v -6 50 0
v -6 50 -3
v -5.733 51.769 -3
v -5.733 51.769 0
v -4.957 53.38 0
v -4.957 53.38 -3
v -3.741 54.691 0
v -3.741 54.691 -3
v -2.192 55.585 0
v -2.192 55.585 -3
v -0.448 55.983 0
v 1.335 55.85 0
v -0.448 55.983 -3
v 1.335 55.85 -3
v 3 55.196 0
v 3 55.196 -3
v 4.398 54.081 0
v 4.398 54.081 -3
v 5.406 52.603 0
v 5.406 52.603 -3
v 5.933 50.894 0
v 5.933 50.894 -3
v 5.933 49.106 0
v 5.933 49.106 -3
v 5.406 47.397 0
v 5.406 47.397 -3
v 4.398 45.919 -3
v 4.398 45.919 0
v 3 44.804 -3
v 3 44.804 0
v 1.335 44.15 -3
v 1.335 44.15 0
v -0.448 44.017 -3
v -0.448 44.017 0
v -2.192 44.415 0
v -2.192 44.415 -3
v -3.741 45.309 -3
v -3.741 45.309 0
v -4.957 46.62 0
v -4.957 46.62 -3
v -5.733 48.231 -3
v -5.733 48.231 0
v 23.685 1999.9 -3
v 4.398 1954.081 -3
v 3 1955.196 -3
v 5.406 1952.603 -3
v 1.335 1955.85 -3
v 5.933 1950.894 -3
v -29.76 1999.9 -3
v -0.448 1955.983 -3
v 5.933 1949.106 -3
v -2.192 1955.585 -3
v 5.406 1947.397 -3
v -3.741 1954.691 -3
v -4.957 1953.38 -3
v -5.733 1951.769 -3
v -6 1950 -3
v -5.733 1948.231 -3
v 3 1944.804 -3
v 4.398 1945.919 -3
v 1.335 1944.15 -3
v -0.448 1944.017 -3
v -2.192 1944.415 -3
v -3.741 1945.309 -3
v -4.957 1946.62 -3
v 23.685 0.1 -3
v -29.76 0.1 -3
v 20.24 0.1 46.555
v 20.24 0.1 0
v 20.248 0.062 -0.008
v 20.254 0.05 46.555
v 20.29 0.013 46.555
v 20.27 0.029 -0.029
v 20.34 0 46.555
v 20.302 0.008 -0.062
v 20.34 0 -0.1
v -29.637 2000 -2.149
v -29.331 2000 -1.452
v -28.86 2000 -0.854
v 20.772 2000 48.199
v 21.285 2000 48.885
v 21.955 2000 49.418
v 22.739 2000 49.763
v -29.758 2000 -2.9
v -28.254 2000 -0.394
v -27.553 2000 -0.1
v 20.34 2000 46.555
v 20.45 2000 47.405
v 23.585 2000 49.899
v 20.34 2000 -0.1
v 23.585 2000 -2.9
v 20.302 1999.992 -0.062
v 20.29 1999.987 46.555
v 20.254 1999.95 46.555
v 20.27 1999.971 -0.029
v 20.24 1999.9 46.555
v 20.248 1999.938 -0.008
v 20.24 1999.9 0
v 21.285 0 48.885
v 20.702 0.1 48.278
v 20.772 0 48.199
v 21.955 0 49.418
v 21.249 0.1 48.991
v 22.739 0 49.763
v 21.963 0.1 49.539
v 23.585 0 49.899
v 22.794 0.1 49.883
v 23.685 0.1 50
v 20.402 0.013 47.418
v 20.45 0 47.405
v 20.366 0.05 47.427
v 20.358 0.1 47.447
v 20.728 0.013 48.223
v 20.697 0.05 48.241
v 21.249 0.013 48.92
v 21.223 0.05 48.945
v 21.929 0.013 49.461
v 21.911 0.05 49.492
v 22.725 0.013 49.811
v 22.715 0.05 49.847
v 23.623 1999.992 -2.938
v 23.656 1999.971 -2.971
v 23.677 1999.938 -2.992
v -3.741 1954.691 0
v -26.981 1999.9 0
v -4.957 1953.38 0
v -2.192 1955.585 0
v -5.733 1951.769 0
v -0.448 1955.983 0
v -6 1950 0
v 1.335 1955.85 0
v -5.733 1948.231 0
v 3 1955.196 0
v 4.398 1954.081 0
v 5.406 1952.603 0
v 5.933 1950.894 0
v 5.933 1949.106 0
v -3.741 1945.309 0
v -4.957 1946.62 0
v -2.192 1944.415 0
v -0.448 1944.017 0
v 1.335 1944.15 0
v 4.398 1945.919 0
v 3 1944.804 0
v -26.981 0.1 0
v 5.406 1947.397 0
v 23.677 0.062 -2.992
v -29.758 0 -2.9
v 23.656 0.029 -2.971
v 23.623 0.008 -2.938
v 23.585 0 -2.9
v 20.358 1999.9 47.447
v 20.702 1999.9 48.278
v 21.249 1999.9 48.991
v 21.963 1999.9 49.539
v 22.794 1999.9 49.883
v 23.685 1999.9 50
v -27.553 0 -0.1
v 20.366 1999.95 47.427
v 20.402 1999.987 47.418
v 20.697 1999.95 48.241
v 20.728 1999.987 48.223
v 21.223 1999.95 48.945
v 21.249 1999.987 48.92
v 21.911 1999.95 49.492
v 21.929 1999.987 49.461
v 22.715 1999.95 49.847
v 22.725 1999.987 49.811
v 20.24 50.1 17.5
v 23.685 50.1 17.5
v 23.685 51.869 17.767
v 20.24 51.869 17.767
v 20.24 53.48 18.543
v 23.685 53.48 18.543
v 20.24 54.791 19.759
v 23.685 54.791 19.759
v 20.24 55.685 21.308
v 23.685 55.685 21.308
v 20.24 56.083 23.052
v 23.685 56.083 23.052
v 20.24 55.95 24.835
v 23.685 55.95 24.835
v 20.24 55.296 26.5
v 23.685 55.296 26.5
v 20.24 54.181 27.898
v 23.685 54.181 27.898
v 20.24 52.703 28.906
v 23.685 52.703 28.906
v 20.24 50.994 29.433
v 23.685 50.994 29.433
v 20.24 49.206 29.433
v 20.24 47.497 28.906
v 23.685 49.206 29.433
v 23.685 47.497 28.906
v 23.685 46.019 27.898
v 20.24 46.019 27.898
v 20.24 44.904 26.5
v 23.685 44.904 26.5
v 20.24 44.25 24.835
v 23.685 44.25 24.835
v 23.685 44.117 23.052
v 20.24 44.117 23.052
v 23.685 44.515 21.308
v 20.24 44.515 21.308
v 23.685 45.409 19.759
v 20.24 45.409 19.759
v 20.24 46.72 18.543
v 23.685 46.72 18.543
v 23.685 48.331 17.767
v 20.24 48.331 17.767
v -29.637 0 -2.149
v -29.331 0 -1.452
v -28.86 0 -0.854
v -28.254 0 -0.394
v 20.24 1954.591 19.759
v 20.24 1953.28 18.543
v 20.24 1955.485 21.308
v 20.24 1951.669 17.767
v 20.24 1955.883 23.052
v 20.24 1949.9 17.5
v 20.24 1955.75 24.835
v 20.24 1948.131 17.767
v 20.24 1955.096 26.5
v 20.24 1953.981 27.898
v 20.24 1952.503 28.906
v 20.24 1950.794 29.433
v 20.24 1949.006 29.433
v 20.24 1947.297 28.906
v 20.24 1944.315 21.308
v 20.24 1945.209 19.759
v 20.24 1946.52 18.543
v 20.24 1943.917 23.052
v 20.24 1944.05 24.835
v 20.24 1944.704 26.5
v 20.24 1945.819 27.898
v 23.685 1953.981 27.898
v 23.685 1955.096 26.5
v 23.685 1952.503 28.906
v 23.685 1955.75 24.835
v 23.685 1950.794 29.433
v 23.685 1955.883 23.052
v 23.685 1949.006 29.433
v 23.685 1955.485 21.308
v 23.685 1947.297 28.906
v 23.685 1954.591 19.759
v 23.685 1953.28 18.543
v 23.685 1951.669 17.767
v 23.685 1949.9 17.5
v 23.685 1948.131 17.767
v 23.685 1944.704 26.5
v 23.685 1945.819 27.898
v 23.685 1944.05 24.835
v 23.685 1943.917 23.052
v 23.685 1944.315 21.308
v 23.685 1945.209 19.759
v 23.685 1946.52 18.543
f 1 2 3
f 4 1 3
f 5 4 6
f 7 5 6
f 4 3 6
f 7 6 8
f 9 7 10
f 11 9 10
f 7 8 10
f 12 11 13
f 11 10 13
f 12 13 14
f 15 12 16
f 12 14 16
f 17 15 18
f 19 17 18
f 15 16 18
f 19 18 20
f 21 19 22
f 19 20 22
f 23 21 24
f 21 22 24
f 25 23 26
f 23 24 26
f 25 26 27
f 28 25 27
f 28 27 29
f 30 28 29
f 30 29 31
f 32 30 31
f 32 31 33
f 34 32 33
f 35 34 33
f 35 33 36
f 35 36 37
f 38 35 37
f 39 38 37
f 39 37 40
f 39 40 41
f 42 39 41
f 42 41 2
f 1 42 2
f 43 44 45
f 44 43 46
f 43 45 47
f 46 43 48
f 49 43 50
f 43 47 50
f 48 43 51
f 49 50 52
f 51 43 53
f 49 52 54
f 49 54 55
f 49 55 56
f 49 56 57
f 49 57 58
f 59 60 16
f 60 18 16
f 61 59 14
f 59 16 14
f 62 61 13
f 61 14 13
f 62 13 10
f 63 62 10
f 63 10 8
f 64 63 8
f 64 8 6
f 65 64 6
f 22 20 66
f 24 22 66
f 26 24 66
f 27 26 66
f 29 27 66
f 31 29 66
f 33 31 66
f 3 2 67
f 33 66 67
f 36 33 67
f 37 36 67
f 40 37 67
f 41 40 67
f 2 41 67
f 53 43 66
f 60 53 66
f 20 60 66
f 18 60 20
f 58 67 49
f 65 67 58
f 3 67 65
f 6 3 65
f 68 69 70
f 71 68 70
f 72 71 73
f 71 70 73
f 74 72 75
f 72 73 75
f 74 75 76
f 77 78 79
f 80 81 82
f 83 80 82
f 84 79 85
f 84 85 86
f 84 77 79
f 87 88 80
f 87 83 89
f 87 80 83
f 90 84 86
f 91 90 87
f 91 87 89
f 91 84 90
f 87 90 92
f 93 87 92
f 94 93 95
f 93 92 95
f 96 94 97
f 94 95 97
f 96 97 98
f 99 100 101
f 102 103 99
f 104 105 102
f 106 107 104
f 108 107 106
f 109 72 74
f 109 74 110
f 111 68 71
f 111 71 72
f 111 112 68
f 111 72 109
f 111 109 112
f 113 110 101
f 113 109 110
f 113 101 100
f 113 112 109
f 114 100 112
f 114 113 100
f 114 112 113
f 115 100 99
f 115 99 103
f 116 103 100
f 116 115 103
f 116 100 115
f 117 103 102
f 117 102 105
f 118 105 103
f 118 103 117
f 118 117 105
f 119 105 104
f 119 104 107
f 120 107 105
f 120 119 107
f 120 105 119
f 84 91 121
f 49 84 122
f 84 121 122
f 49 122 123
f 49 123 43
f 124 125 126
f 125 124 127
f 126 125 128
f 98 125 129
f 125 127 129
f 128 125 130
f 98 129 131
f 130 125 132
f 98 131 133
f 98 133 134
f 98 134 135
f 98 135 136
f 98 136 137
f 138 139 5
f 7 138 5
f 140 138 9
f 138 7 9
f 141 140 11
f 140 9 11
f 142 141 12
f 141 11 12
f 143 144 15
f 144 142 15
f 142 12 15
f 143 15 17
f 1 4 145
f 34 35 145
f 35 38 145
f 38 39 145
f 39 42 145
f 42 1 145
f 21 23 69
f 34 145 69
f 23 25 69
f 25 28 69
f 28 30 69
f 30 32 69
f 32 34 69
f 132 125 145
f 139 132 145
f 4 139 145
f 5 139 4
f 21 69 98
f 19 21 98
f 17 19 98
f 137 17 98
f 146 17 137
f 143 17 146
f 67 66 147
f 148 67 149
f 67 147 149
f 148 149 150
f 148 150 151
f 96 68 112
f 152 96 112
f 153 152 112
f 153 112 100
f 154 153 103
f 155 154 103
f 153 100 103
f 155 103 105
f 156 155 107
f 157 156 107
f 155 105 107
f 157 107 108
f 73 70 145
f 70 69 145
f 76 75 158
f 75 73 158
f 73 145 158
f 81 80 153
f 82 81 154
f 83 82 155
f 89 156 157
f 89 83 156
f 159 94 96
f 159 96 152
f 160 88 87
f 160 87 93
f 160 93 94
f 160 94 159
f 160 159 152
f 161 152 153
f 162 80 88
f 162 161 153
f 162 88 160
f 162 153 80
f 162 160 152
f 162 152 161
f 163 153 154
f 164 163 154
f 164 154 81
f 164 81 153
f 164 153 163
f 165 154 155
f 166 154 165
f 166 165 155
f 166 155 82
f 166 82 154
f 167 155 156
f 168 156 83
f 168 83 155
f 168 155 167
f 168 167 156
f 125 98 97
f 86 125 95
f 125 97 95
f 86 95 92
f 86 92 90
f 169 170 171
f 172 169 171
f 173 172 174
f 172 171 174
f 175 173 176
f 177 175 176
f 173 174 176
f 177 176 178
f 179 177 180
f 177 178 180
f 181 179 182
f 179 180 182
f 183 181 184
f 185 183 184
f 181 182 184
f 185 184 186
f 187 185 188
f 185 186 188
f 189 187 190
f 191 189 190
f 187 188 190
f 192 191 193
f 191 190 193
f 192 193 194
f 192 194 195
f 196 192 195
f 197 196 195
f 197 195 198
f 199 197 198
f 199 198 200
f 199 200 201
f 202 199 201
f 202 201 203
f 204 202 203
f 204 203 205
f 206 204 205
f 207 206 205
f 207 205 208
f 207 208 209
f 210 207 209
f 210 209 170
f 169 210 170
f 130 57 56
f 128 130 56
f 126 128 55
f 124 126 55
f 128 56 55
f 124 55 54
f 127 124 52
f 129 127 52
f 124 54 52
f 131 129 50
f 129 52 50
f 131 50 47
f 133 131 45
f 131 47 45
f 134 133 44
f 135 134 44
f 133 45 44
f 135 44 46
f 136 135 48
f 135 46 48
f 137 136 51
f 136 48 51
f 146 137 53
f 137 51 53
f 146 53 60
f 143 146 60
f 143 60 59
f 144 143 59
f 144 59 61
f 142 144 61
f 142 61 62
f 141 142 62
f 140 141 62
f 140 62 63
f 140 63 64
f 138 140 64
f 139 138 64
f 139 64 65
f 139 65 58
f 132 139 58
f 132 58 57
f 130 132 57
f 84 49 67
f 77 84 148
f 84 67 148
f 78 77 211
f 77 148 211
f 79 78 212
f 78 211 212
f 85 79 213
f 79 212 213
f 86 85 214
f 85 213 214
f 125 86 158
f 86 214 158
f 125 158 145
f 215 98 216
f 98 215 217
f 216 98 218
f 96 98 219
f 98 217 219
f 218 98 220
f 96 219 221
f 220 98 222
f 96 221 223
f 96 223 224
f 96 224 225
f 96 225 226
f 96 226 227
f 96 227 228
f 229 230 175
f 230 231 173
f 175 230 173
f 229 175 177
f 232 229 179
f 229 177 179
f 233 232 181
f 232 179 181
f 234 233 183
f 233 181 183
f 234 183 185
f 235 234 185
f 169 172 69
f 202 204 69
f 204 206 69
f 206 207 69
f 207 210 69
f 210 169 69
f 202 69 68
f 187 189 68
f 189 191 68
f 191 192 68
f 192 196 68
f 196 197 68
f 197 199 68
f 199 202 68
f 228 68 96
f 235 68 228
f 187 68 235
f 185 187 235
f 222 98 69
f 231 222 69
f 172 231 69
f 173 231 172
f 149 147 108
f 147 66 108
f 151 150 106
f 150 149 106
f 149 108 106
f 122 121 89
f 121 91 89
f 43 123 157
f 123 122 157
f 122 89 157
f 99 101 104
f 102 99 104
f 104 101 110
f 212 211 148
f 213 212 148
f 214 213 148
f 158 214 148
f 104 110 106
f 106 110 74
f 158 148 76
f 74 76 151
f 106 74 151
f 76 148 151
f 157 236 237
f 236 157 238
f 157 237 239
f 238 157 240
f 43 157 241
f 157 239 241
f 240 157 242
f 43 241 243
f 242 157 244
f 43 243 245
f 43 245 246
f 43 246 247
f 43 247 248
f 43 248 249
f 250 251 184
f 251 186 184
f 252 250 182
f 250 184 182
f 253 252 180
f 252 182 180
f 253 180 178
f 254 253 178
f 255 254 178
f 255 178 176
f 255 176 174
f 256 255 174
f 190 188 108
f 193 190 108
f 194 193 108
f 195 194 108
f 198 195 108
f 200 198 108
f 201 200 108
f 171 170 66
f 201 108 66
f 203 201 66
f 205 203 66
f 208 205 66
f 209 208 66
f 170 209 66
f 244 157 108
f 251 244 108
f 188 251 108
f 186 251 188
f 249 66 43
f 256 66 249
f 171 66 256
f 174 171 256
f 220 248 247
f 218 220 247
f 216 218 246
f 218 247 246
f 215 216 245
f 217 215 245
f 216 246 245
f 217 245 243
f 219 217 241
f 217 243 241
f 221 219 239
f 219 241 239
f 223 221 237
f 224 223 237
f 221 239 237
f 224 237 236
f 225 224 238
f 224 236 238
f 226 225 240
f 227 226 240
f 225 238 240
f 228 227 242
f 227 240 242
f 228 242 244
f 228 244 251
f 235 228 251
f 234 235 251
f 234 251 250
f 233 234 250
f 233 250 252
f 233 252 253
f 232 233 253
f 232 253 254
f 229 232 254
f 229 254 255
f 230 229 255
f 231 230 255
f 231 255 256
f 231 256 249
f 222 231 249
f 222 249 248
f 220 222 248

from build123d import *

# Parameters (mm, degrees)
EXTRUDE_1_DEPTH        = 2000
FILLET_1_R             = 0.1
SKETCH_2_R             = 6
CUT_EXTRUDE_1_DEPTH    = 200
SKETCH_5_R             = 6
CUT_EXTRUDE_2_DEPTH    = 200
PATTERN_LINEAR_1_COUNT = 2
PATTERN_LINEAR_1_PITCH = 1900


with BuildPart() as part:
    # 草图1 → 凸台-拉伸1 (new body)
    with BuildSketch(Plane(origin=(0, 0, 0), x_dir=(1, 0, 0), z_dir=(0, 1, 0))):
        with BuildLine():
            ThreePointArc((-29.759542218, 3), (-28.958115236, 0.95539927), (-26.980771162, 0))
            Line((-26.980771162, 0), (-26.520700364, 0))
            Line((-26.520700364, 0), (20.240457782, 0))
            Line((20.240457782, 0), (20.240457782, -46.555391571))
            ThreePointArc((20.240457782, -46.555391571), (21.249360232, -48.99109755), (23.68506621, -50))
            Line((23.68506621, -50), (23.68506621, 3))
            Line((23.68506621, 3), (-29.759542218, 3))
        make_face()
    extrude(amount=EXTRUDE_1_DEPTH)

    # 圆角1
    # the kernel refuses this fillet: 0.1 mm, written as the material it takes off along each edge
    with BuildSketch(Plane(origin=(24.28506621, 2000, -3), x_dir=(0, 0, 1), z_dir=(-1, 0, 0))) as fillet_1_piece_1:
        with BuildLine():
            CenterArc((FILLET_1_R, -FILLET_1_R), FILLET_1_R, 90, 90)
            Line((0, -FILLET_1_R), (-FILLET_1_R * 0.02, -FILLET_1_R))
            Line((-FILLET_1_R * 0.02, -FILLET_1_R), (-FILLET_1_R * 0.02, FILLET_1_R * 0.0199999999995))
            Line((-FILLET_1_R * 0.02, FILLET_1_R * 0.0199999999995), (FILLET_1_R, FILLET_1_R * 0.0199999999995))
            Line((FILLET_1_R, FILLET_1_R * 0.0199999999995), (FILLET_1_R, 0))
        make_face()
    extrude(amount=54.644608429, mode=Mode.SUBTRACT)
    with BuildSketch(Plane(origin=(20.240457782, 2000, 0), x_dir=(0, 0, -1), z_dir=(-1, 0, 0)), Plane(origin=(-27.580771162, 0, 0), x_dir=(0, 0, -1), z_dir=(1, 0, 0))) as fillet_1_piece_2:
        with BuildLine():
            CenterArc((FILLET_1_R, FILLET_1_R), FILLET_1_R, 180, 90)
            Line((0, FILLET_1_R), (-FILLET_1_R * 0.02, FILLET_1_R))
            Line((-FILLET_1_R * 0.02, FILLET_1_R), (-FILLET_1_R * 0.02, -FILLET_1_R * 0.0199999999995))
            Line((-FILLET_1_R * 0.02, -FILLET_1_R * 0.0199999999995), (FILLET_1_R, -FILLET_1_R * 0.0199999999995))
            Line((FILLET_1_R, -FILLET_1_R * 0.0199999999995), (FILLET_1_R, 0))
        make_face()
    extrude(amount=47.821228944, mode=Mode.SUBTRACT)
    with BuildSketch(Plane(origin=(20.240457782, 2000, 0), x_dir=(1, 0, 0), z_dir=(0, 0, 1)), Plane(origin=(20.240457782, 0, 0), x_dir=(0, 1, 0), z_dir=(0, 0, 1))) as fillet_1_piece_3:
        with BuildLine():
            CenterArc((FILLET_1_R, -FILLET_1_R), FILLET_1_R, 90, 90)
            Line((0, -FILLET_1_R), (-FILLET_1_R * 0.02, -FILLET_1_R))
            Line((-FILLET_1_R * 0.02, -FILLET_1_R), (-FILLET_1_R * 0.02, FILLET_1_R * 0.0199999999995))
            Line((-FILLET_1_R * 0.02, FILLET_1_R * 0.0199999999995), (FILLET_1_R, FILLET_1_R * 0.0199999999995))
            Line((FILLET_1_R, FILLET_1_R * 0.0199999999995), (FILLET_1_R, 0))
        make_face()
    extrude(amount=46.555391571, mode=Mode.SUBTRACT)
    with BuildSketch(Plane(origin=(23.68506621, 2000, 46.555391571), x_dir=(-1, 0, 0), z_dir=(0, 0, -1))) as fillet_1_piece_4:
        with BuildLine():
            CenterArc((3.444608429 - FILLET_1_R, -FILLET_1_R), FILLET_1_R, 0, 90)
            Line((3.444608429, -FILLET_1_R), (3.444608429 + FILLET_1_R * 0.02, -FILLET_1_R))
            Line((3.444608429 + FILLET_1_R * 0.02, -FILLET_1_R), (3.444608429 + FILLET_1_R * 0.02, FILLET_1_R * 0.0199999999995))
            Line((3.444608429 + FILLET_1_R * 0.02, FILLET_1_R * 0.0199999999995), (3.444608429 - FILLET_1_R, FILLET_1_R * 0.0199999999995))
            Line((3.444608429 - FILLET_1_R, FILLET_1_R * 0.0199999999995), (3.444608429 - FILLET_1_R, 0))
        make_face()
    revolve(axis=Axis((23.68506621, 2000, 46.555391571), (0, 1, 0)), revolution_arc=99.984089086, mode=Mode.SUBTRACT)
    with BuildSketch(Plane(origin=(24.28506621, 0, -3), x_dir=(0, 0, 1), z_dir=(-1, 0, 0))) as fillet_1_piece_5:
        with BuildLine():
            CenterArc((FILLET_1_R, FILLET_1_R), FILLET_1_R, 180, 90)
            Line((0, FILLET_1_R), (-FILLET_1_R * 0.02, FILLET_1_R))
            Line((-FILLET_1_R * 0.02, FILLET_1_R), (-FILLET_1_R * 0.02, -FILLET_1_R * 0.02))
            Line((-FILLET_1_R * 0.02, -FILLET_1_R * 0.02), (FILLET_1_R, -FILLET_1_R * 0.02))
            Line((FILLET_1_R, -FILLET_1_R * 0.02), (FILLET_1_R, 0))
        make_face()
    extrude(amount=54.644608429, mode=Mode.SUBTRACT)
    with BuildSketch(Plane(origin=(23.68506621, 2000, 50.6), x_dir=(-1, 0, 0), z_dir=(0, 0, -1)), Plane(origin=(23.68506621, 0, 50.6), x_dir=(0, 1, 0), z_dir=(0, 0, -1))) as fillet_1_piece_6:
        with BuildLine():
            CenterArc((FILLET_1_R, -FILLET_1_R), FILLET_1_R, 90, 90)
            Line((0, -FILLET_1_R), (-FILLET_1_R * 0.02, -FILLET_1_R))
            Line((-FILLET_1_R * 0.02, -FILLET_1_R), (-FILLET_1_R * 0.02, FILLET_1_R * 0.0199999999995))
            Line((-FILLET_1_R * 0.02, FILLET_1_R * 0.0199999999995), (FILLET_1_R, FILLET_1_R * 0.0199999999995))
            Line((FILLET_1_R, FILLET_1_R * 0.0199999999995), (FILLET_1_R, 0))
        make_face()
    extrude(amount=54.2, mode=Mode.SUBTRACT)
    with BuildSketch(Plane(origin=(23.68506621, 0, 46.555391571), x_dir=(-1, 0, 0), z_dir=(0, 0, -1))) as fillet_1_piece_7:
        with BuildLine():
            CenterArc((3.444608429 - FILLET_1_R, FILLET_1_R), FILLET_1_R, 270, 90)
            Line((3.444608429 - FILLET_1_R, 0), (3.444608429 - FILLET_1_R, -FILLET_1_R * 0.02))
            Line((3.444608429 - FILLET_1_R, -FILLET_1_R * 0.02), (3.444608429 + FILLET_1_R * 0.02, -FILLET_1_R * 0.02))
            Line((3.444608429 + FILLET_1_R * 0.02, -FILLET_1_R * 0.02), (3.444608429 + FILLET_1_R * 0.02, FILLET_1_R))
            Line((3.444608429 + FILLET_1_R * 0.02, FILLET_1_R), (3.444608429, FILLET_1_R))
        make_face()
    revolve(axis=Axis((23.68506621, 0, 46.555391571), (0, 1, 0)), revolution_arc=99.984089086, mode=Mode.SUBTRACT)
    with BuildSketch(Plane(origin=(20.840457782, 2000, 0), x_dir=(0, 0, -1), z_dir=(-1, 0, 0))) as fillet_1_piece_8a_section:
        with BuildLine():
            CenterArc((FILLET_1_R, FILLET_1_R), FILLET_1_R, 180, 90)
            Line((0, FILLET_1_R), (-FILLET_1_R * 0.02, FILLET_1_R))
            Line((-FILLET_1_R * 0.02, FILLET_1_R), (-FILLET_1_R * 0.02, -FILLET_1_R * 0.0199999999995))
            Line((-FILLET_1_R * 0.02, -FILLET_1_R * 0.0199999999995), (FILLET_1_R, -FILLET_1_R * 0.0199999999995))
            Line((FILLET_1_R, -FILLET_1_R * 0.0199999999995), (FILLET_1_R, 0))
        make_face()
    fillet_1_piece_8a = extrude(amount=48.421228944, mode=Mode.PRIVATE)
    fillet_1_piece_8a = split(fillet_1_piece_8a, bisect_by=Plane(origin=(20.240457782, 1999.977360489, -0.022639511), z_dir=(1, 0, 0)), keep=Keep.TOP, mode=Mode.PRIVATE)
    with BuildSketch(Plane(origin=(20.240457782, 2000, -0.6), x_dir=(1, 0, 0), z_dir=(0, 0, 1))) as fillet_1_piece_8b_section:
        with BuildLine():
            CenterArc((FILLET_1_R, -FILLET_1_R), FILLET_1_R, 90, 90)
            Line((0, -FILLET_1_R), (-FILLET_1_R * 0.02, -FILLET_1_R))
            Line((-FILLET_1_R * 0.02, -FILLET_1_R), (-FILLET_1_R * 0.02, FILLET_1_R * 0.0199999999995))
            Line((-FILLET_1_R * 0.02, FILLET_1_R * 0.0199999999995), (FILLET_1_R, FILLET_1_R * 0.0199999999995))
            Line((FILLET_1_R, FILLET_1_R * 0.0199999999995), (FILLET_1_R, 0))
        make_face()
    fillet_1_piece_8b = extrude(amount=47.155391571, mode=Mode.PRIVATE)
    fillet_1_piece_8b = split(fillet_1_piece_8b, bisect_by=Plane(origin=(20.263097293, 1999.977360489, 0), z_dir=(0, 0, -1)), keep=Keep.TOP, mode=Mode.PRIVATE)
    fillet_1_piece_8 = fillet_1_piece_8a & fillet_1_piece_8b
    add(fillet_1_piece_8, mode=Mode.SUBTRACT)
    with BuildSketch(Plane(origin=(20.240457782, 0, -0.6), x_dir=(0, 1, 0), z_dir=(0, 0, 1))) as fillet_1_piece_9a_section:
        with BuildLine():
            CenterArc((FILLET_1_R, -FILLET_1_R), FILLET_1_R, 90, 90)
            Line((0, -FILLET_1_R), (-FILLET_1_R * 0.02, -FILLET_1_R))
            Line((-FILLET_1_R * 0.02, -FILLET_1_R), (-FILLET_1_R * 0.02, FILLET_1_R * 0.02))
            Line((-FILLET_1_R * 0.02, FILLET_1_R * 0.02), (FILLET_1_R, FILLET_1_R * 0.02))
            Line((FILLET_1_R, FILLET_1_R * 0.02), (FILLET_1_R, 0))
        make_face()
    fillet_1_piece_9a = extrude(amount=47.155391571, mode=Mode.PRIVATE)
    fillet_1_piece_9a = split(fillet_1_piece_9a, bisect_by=Plane(origin=(20.263097293, 0.022639511, 0), z_dir=(0, 0, -1)), keep=Keep.TOP, mode=Mode.PRIVATE)
    with BuildSketch(Plane(origin=(-27.580771162, 0, 0), x_dir=(0, 0, -1), z_dir=(1, 0, 0))) as fillet_1_piece_9b_section:
        with BuildLine():
            CenterArc((FILLET_1_R, FILLET_1_R), FILLET_1_R, 180, 90)
            Line((0, FILLET_1_R), (-FILLET_1_R * 0.02, FILLET_1_R))
            Line((-FILLET_1_R * 0.02, FILLET_1_R), (-FILLET_1_R * 0.02, -FILLET_1_R * 0.02))
            Line((-FILLET_1_R * 0.02, -FILLET_1_R * 0.02), (FILLET_1_R, -FILLET_1_R * 0.02))
            Line((FILLET_1_R, -FILLET_1_R * 0.02), (FILLET_1_R, 0))
        make_face()
    fillet_1_piece_9b = extrude(amount=48.421228944, mode=Mode.PRIVATE)
    fillet_1_piece_9b = split(fillet_1_piece_9b, bisect_by=Plane(origin=(20.240457782, 0.022639511, -0.022639511), z_dir=(1, 0, 0)), keep=Keep.TOP, mode=Mode.PRIVATE)
    fillet_1_piece_9 = fillet_1_piece_9a & fillet_1_piece_9b
    add(fillet_1_piece_9, mode=Mode.SUBTRACT)

    # 草图2 → 切除-拉伸1 (cut)
    with BuildSketch(Plane(origin=(23.68506621, 0, 0), x_dir=(0, 0, -1), z_dir=(1, 0, 0))):
        with Locations((-23.5, 50.1)):
            Circle(SKETCH_2_R)
        with Locations((-23.5, 1949.9)):
            Circle(SKETCH_2_R)
    extrude(amount=-CUT_EXTRUDE_1_DEPTH, mode=Mode.SUBTRACT)

    # 草图5 → 切除-拉伸2 (cut)
    with BuildSketch(Plane(origin=(0, 0, -3), x_dir=(-1, 0, 0), z_dir=(0, 0, -1))):
        with Locations((0, 50)):
            Circle(SKETCH_5_R)
    cut_extrude_2 = extrude(amount=-CUT_EXTRUDE_2_DEPTH, mode=Mode.SUBTRACT)

    # 阵列(线性)1: 切除-拉伸2 ×2
    with Locations(*[(0, i * PATTERN_LINEAR_1_PITCH, 0) for i in range(1, PATTERN_LINEAR_1_COUNT)]):
        add(cut_extrude_2, mode=Mode.SUBTRACT)


solid = part.part
